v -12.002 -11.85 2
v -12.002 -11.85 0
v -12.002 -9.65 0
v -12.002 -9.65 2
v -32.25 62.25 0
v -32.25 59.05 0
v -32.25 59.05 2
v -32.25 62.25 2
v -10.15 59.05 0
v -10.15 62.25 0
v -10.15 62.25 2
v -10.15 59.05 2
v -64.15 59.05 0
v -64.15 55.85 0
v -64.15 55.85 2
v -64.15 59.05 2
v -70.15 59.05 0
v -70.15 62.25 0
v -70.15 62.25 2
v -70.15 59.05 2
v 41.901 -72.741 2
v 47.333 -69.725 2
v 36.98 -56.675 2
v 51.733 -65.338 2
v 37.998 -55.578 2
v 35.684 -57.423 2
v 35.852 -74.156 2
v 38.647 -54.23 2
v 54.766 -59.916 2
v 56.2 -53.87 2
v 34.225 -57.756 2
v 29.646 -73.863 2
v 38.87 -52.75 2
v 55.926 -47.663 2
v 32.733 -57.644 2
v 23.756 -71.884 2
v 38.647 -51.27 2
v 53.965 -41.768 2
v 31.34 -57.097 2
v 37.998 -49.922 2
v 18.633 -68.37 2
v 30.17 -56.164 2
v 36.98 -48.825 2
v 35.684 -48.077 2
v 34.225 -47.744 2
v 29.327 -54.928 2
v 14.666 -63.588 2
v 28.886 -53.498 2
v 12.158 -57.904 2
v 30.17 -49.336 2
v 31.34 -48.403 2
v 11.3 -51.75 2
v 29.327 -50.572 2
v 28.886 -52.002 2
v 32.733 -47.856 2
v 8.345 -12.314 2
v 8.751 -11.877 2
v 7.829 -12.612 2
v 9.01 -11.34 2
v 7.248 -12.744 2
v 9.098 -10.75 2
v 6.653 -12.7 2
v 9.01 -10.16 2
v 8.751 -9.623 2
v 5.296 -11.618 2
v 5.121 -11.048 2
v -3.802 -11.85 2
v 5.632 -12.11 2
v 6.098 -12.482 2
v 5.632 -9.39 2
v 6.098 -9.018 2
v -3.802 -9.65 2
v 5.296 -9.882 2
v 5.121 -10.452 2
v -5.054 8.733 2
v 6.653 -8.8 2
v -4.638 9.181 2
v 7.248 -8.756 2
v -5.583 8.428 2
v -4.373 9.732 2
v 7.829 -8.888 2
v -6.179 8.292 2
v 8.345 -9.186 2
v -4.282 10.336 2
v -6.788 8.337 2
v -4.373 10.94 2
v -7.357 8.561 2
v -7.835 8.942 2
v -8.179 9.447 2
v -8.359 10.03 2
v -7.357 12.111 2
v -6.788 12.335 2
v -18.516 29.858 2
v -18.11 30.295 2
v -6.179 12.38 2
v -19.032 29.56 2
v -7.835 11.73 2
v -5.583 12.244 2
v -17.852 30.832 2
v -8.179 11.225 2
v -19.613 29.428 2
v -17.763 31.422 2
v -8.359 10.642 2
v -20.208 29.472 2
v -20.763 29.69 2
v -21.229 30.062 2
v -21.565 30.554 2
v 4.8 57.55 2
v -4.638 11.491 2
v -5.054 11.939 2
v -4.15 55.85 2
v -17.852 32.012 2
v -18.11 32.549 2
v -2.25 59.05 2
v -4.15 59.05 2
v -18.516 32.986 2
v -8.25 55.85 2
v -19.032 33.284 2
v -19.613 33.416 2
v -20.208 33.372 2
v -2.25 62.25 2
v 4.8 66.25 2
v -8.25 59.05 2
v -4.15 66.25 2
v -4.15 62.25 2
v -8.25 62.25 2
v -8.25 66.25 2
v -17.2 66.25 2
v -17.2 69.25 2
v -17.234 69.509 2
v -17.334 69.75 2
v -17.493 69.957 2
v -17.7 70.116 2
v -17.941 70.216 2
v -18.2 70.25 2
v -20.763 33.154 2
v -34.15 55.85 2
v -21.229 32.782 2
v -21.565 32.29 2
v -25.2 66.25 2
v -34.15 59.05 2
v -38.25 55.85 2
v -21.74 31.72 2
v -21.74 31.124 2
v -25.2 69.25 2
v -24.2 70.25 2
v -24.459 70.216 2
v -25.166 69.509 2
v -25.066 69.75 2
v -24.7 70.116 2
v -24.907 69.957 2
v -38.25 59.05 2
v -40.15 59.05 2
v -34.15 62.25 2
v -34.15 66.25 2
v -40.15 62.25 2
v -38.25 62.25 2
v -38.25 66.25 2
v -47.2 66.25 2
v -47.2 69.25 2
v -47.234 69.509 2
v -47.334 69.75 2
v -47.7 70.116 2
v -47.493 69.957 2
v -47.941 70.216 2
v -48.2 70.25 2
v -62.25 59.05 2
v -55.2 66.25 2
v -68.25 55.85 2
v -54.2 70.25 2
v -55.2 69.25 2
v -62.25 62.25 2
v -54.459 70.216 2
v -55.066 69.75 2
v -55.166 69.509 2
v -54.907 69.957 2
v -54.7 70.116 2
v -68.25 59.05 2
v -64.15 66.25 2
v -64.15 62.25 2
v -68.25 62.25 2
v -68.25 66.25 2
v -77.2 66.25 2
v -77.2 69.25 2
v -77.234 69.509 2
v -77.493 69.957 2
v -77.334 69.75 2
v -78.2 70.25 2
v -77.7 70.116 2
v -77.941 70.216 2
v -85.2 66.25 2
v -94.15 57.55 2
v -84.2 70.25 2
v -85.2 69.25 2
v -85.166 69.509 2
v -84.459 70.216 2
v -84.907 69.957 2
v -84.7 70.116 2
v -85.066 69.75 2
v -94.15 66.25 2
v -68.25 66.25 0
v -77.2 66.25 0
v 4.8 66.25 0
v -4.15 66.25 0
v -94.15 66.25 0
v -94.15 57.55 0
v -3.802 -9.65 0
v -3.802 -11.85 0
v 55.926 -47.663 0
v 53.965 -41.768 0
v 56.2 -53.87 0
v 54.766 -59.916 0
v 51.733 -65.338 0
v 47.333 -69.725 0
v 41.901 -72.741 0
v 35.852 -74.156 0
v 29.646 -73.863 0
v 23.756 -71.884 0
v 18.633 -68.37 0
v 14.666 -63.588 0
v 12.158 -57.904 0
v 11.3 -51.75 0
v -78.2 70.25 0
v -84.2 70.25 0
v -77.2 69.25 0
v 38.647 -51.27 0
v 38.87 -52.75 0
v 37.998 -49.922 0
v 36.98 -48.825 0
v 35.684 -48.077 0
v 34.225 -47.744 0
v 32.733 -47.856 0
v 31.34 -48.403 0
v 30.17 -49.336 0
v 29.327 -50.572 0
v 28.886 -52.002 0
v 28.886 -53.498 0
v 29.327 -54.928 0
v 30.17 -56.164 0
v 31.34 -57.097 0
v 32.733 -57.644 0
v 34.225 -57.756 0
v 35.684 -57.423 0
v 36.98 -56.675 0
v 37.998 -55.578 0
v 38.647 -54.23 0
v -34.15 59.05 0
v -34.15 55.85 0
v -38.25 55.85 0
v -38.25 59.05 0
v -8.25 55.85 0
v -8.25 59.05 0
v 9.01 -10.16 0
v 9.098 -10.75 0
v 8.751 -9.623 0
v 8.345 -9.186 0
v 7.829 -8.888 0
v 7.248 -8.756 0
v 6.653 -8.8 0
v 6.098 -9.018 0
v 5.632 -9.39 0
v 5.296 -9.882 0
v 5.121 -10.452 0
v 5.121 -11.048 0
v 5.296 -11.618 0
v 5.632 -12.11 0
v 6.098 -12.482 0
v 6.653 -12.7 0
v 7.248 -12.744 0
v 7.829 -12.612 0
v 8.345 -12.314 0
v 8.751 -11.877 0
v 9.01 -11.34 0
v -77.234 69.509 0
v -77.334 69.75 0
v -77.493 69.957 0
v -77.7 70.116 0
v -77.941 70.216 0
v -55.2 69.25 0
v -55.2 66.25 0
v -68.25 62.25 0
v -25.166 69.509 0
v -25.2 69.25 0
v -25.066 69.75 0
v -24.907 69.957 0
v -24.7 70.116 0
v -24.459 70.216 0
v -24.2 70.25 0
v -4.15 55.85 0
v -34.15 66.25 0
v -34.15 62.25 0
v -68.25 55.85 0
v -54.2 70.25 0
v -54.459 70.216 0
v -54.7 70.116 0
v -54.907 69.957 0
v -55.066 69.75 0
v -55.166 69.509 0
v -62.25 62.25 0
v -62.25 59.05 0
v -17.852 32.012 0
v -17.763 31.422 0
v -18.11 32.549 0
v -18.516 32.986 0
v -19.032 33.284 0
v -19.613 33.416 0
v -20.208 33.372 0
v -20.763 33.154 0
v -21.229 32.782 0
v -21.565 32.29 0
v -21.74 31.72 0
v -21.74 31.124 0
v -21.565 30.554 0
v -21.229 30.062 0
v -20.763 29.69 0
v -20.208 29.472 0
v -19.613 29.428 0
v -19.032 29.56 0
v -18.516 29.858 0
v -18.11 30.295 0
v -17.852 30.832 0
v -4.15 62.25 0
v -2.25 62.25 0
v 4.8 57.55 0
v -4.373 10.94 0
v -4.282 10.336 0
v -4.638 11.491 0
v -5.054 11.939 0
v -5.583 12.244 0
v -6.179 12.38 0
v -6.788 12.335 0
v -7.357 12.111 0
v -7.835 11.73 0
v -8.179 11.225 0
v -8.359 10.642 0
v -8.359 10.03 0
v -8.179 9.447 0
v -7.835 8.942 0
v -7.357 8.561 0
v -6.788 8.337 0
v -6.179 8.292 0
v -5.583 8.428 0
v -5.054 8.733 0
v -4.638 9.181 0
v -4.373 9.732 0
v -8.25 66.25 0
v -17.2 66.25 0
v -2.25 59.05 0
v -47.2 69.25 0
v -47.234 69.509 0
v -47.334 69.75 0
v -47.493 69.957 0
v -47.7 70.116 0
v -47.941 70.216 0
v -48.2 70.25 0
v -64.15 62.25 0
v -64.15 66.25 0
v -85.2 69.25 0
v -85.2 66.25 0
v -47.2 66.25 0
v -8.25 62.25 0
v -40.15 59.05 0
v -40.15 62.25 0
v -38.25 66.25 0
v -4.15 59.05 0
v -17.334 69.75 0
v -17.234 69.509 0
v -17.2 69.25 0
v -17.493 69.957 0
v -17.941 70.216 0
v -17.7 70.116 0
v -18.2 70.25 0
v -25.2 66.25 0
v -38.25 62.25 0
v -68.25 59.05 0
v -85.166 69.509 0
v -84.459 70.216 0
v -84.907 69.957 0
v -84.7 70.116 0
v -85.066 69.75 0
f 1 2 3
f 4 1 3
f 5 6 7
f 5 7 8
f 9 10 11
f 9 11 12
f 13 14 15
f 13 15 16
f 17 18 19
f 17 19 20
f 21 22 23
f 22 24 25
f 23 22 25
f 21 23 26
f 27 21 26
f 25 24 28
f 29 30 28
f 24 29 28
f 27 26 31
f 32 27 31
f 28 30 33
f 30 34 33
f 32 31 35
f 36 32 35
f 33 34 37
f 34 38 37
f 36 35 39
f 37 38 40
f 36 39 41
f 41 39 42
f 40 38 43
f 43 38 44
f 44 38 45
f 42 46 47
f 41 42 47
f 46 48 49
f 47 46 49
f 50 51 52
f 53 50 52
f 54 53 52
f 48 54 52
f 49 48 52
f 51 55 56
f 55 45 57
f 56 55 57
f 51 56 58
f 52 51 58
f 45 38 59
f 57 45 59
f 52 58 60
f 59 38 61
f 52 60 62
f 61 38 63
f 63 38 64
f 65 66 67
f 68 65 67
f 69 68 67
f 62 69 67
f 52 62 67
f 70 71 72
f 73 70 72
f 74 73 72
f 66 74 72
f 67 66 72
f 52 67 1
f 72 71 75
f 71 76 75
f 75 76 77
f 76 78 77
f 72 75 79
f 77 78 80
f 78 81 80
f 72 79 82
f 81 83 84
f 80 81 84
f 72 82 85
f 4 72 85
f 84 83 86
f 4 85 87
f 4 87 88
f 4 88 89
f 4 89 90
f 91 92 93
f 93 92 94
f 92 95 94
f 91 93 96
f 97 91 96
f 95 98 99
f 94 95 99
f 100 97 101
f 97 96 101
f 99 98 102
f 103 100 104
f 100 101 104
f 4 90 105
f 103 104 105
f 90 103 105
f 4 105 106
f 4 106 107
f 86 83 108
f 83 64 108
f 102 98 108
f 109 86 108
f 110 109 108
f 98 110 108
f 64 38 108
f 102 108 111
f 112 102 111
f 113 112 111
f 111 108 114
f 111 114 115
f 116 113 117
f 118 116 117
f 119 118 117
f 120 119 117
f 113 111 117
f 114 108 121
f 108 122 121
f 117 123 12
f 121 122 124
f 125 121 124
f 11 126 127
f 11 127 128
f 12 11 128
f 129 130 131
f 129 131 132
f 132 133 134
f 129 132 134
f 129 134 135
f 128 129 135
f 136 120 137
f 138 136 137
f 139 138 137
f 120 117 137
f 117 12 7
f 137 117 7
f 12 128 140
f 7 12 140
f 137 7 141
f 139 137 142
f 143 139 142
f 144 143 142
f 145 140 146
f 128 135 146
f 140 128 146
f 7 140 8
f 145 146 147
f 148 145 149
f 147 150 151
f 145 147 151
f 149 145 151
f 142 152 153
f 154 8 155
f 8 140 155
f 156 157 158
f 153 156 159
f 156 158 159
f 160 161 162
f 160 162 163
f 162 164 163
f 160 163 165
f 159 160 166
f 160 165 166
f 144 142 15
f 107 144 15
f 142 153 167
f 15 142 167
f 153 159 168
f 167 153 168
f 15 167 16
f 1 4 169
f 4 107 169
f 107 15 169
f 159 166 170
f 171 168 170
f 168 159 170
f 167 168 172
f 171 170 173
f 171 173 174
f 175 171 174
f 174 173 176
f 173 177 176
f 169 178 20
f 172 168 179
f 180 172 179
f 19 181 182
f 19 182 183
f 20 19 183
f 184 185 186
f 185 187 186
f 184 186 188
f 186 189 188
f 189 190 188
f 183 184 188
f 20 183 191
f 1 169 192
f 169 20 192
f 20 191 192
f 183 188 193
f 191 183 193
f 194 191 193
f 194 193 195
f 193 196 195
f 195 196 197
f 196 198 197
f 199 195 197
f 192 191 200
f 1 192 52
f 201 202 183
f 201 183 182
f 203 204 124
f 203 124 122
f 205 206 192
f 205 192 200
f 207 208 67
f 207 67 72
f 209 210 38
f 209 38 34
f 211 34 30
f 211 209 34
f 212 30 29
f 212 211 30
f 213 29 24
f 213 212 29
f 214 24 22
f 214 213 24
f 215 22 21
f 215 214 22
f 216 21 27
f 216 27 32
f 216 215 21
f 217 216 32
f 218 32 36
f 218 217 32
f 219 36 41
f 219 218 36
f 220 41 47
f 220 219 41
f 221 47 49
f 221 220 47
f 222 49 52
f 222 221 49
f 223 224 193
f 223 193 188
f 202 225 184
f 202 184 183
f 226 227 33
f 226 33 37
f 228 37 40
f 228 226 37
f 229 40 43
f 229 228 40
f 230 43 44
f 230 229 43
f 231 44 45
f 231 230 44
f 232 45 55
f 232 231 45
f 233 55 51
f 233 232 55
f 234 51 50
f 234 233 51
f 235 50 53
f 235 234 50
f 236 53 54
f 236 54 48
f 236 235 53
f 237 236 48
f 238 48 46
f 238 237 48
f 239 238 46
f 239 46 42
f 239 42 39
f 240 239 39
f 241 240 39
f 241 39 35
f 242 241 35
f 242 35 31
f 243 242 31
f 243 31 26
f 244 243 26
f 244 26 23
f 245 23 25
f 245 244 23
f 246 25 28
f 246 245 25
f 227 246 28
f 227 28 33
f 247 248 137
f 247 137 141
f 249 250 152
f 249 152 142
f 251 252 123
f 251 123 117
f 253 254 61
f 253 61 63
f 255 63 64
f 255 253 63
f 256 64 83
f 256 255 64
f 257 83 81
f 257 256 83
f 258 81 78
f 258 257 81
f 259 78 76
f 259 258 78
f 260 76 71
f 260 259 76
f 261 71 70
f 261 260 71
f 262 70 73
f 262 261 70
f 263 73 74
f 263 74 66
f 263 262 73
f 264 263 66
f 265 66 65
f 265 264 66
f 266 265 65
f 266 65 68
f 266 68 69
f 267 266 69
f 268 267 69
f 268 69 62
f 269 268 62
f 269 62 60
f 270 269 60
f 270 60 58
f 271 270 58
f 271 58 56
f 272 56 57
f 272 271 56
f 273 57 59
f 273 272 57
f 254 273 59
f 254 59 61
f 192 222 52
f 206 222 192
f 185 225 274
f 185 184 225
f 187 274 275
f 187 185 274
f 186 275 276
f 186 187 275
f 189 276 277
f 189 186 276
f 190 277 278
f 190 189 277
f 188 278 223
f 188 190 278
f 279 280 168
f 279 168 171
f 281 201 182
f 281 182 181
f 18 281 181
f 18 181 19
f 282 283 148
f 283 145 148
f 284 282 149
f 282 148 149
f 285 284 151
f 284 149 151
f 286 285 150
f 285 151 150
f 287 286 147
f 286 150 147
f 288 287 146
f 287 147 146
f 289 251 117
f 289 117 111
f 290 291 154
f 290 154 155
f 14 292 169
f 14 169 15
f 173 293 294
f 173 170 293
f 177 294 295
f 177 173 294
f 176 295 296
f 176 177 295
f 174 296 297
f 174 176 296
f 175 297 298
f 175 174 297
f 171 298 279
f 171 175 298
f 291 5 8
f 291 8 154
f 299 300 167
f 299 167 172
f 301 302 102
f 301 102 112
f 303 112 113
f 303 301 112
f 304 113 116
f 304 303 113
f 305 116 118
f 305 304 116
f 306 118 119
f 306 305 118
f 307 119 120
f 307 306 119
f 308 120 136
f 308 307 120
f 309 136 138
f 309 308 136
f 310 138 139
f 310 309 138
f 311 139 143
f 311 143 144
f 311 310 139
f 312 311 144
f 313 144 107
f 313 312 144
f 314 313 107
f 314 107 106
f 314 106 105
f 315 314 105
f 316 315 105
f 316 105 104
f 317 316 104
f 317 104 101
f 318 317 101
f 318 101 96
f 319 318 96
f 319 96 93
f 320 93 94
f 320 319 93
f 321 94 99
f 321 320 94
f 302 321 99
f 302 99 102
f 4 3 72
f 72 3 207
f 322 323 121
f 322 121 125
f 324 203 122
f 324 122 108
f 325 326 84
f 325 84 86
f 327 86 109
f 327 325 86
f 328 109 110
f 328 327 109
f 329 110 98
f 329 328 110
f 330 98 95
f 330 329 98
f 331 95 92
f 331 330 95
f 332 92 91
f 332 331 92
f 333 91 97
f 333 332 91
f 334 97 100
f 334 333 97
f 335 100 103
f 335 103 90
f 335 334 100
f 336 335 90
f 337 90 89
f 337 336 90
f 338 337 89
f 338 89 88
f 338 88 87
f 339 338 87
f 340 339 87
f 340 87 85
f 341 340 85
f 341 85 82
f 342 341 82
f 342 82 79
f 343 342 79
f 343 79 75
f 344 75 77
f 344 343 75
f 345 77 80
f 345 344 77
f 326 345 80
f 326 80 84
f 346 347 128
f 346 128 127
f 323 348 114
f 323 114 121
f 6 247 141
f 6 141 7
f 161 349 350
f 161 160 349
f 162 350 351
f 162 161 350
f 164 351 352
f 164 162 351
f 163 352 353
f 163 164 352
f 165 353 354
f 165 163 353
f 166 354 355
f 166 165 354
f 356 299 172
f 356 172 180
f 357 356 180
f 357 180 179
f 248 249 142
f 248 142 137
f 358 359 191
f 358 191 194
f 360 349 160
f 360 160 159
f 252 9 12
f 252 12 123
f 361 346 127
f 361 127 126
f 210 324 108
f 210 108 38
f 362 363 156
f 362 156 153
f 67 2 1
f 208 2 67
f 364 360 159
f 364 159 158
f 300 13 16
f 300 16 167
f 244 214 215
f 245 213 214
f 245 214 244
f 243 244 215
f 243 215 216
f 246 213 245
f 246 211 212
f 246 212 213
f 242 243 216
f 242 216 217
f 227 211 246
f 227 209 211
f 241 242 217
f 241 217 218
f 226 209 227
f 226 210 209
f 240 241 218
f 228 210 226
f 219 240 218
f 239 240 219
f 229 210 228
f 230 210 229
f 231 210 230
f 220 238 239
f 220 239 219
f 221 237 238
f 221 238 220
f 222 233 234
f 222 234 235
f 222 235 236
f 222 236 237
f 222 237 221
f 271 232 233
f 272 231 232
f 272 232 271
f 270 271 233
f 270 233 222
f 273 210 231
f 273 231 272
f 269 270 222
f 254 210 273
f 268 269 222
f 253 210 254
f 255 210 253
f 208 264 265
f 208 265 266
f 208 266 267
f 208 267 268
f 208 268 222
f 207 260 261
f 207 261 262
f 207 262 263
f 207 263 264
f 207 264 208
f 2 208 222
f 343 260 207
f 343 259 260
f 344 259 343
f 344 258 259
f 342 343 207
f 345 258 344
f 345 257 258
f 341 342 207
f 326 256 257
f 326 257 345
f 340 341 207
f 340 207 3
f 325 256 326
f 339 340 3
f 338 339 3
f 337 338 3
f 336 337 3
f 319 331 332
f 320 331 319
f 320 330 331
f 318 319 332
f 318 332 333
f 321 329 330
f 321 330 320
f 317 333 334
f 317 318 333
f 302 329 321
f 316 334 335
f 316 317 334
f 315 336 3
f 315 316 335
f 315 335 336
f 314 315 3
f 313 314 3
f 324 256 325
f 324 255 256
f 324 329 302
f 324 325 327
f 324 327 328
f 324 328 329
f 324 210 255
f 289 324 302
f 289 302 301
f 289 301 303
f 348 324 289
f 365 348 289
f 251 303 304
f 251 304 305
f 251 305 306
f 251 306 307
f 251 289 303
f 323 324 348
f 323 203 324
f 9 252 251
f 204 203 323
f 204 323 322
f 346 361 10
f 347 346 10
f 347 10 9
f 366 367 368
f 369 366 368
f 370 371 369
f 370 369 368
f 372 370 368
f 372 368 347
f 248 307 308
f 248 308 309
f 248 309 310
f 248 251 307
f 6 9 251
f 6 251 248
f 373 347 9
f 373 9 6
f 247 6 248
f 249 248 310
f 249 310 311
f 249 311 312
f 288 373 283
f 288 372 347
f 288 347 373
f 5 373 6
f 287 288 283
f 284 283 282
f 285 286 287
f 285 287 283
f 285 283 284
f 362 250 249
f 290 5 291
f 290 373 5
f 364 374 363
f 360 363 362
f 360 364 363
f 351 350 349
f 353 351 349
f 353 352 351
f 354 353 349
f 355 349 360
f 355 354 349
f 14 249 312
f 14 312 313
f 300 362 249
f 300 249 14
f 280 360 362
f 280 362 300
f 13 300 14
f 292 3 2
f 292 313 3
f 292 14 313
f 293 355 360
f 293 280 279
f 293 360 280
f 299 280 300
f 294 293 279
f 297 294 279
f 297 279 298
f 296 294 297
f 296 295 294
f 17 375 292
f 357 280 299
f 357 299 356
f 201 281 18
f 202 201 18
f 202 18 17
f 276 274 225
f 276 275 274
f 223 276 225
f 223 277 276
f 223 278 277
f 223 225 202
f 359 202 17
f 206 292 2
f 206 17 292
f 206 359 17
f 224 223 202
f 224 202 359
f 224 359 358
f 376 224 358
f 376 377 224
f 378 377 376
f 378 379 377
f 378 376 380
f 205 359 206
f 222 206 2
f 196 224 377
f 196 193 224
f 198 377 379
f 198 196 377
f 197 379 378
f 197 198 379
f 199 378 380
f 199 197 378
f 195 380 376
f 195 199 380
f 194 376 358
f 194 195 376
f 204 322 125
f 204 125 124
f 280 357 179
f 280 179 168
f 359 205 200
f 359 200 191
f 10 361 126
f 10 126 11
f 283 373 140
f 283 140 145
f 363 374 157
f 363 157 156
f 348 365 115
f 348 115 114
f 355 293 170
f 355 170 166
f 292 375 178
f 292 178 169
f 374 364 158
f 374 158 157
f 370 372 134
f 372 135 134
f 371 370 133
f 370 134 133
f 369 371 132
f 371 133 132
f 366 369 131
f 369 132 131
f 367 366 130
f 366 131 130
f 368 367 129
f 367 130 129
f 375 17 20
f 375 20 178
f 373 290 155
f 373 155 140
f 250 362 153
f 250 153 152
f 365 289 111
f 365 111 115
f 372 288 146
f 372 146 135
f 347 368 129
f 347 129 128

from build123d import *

# Parameters (mm, degrees)
SKETCH_1_R      = 2
SKETCH_1_R_2    = 5.02
SKETCH_1_R_3    = 2.05
SKETCH_1_W      = 8.2
SKETCH_1_H      = 2.2
EXTRUDE_1_DEPTH = 2
FILLET_1_R      = 1


with BuildPart() as part:
    # 草图1 → 凸台-拉伸1 (new body)
    with BuildSketch(Plane.XY):
        with BuildLine():
            Line((-38.25, 66.25), (-38.25, 62.25))
            Line((-38.25, 62.25), (-40.15, 62.25))
            Line((-40.15, 62.25), (-40.15, 59.05))
            Line((-40.15, 59.05), (-38.25, 59.05))
            Line((-38.25, 59.05), (-38.25, 55.85))
            Line((-38.25, 55.85), (-34.15, 55.85))
            Line((-34.15, 55.85), (-34.15, 59.05))
            Line((-34.15, 59.05), (-32.25, 59.05))
            Line((-32.25, 59.05), (-32.25, 62.25))
            Line((-32.25, 62.25), (-34.15, 62.25))
            Line((-34.15, 62.25), (-34.15, 66.25))
            Line((-34.15, 66.25), (-25.2, 66.25))
            Line((-25.2, 66.25), (-25.2, 70.25))
            Line((-25.2, 70.25), (-17.2, 70.25))
            Line((-17.2, 70.25), (-17.2, 66.25))
            Line((-17.2, 66.25), (-8.25, 66.25))
            Line((-8.25, 66.25), (-8.25, 62.25))
            Line((-8.25, 62.25), (-10.15, 62.25))
            Line((-10.15, 62.25), (-10.15, 59.05))
            Line((-10.15, 59.05), (-8.25, 59.05))
            Line((-8.25, 59.05), (-8.25, 55.85))
            Line((-8.25, 55.85), (-4.15, 55.85))
            Line((-4.15, 55.85), (-4.15, 59.05))
            Line((-4.15, 59.05), (-2.25, 59.05))
            Line((-2.25, 59.05), (-2.25, 62.25))
            Line((-2.25, 62.25), (-4.15, 62.25))
            Line((-4.15, 62.25), (-4.15, 66.25))
            Line((-4.15, 66.25), (4.8, 66.25))
            Line((4.8, 66.25), (4.8, 57.55))
            Line((4.8, 57.55), (53.96460577, -41.768082641))
            ThreePointArc((53.96460577, -41.768082641), (38.925737517, -73.658373169), (11.3, -51.75))
            Line((11.3, -51.75), (-94.15, 57.55))
            Line((-94.15, 57.55), (-94.15, 66.25))
            Line((-94.15, 66.25), (-85.2, 66.25))
            Line((-85.2, 66.25), (-85.2, 70.25))
            Line((-85.2, 70.25), (-77.2, 70.25))
            Line((-77.2, 70.25), (-77.2, 66.25))
            Line((-77.2, 66.25), (-68.25, 66.25))
            Line((-68.25, 66.25), (-68.25, 62.25))
            Line((-68.25, 62.25), (-70.15, 62.25))
            Line((-70.15, 62.25), (-70.15, 59.05))
            Line((-70.15, 59.05), (-68.25, 59.05))
            Line((-68.25, 59.05), (-68.25, 55.85))
            Line((-68.25, 55.85), (-64.15, 55.85))
            Line((-64.15, 55.85), (-64.15, 59.05))
            Line((-64.15, 59.05), (-62.25, 59.05))
            Line((-62.25, 59.05), (-62.25, 62.25))
            Line((-62.25, 62.25), (-64.15, 62.25))
            Line((-64.15, 62.25), (-64.15, 66.25))
            Line((-64.15, 66.25), (-55.2, 66.25))
            Line((-55.2, 66.25), (-55.2, 70.25))
            Line((-55.2, 70.25), (-47.2, 70.25))
            Line((-47.2, 70.25), (-47.2, 66.25))
            Line((-47.2, 66.25), (-38.25, 66.25))
        make_face()
        with Locations((-19.762745434, 31.422010331)):
            Circle(SKETCH_1_R, mode=Mode.SUBTRACT)
        with Locations((7.098407643, -10.75)):
            Circle(SKETCH_1_R, mode=Mode.SUBTRACT)
        with Locations((33.85, -52.75)):
            Circle(SKETCH_1_R_2, mode=Mode.SUBTRACT)
        with Locations((-6.332168895, 10.336005166)):
            Circle(SKETCH_1_R_3, mode=Mode.SUBTRACT)
        with Locations((-7.901592357, -10.75)):
            Rectangle(SKETCH_1_W, SKETCH_1_H, mode=Mode.SUBTRACT)
    extrude(amount=EXTRUDE_1_DEPTH)

    # 圆角1
    fillet_1_edges = [part.edges().sort_by_distance(p)[0] for p in [
        (-25.2, 70.25, 1),
        (-17.2, 70.25, 1),
        (-85.2, 70.25, 1),
        (-77.2, 70.25, 1),
        (-55.2, 70.25, 1),
        (-47.2, 70.25, 1),
    ]]
    fillet(fillet_1_edges, radius=FILLET_1_R)


solid = part.part
